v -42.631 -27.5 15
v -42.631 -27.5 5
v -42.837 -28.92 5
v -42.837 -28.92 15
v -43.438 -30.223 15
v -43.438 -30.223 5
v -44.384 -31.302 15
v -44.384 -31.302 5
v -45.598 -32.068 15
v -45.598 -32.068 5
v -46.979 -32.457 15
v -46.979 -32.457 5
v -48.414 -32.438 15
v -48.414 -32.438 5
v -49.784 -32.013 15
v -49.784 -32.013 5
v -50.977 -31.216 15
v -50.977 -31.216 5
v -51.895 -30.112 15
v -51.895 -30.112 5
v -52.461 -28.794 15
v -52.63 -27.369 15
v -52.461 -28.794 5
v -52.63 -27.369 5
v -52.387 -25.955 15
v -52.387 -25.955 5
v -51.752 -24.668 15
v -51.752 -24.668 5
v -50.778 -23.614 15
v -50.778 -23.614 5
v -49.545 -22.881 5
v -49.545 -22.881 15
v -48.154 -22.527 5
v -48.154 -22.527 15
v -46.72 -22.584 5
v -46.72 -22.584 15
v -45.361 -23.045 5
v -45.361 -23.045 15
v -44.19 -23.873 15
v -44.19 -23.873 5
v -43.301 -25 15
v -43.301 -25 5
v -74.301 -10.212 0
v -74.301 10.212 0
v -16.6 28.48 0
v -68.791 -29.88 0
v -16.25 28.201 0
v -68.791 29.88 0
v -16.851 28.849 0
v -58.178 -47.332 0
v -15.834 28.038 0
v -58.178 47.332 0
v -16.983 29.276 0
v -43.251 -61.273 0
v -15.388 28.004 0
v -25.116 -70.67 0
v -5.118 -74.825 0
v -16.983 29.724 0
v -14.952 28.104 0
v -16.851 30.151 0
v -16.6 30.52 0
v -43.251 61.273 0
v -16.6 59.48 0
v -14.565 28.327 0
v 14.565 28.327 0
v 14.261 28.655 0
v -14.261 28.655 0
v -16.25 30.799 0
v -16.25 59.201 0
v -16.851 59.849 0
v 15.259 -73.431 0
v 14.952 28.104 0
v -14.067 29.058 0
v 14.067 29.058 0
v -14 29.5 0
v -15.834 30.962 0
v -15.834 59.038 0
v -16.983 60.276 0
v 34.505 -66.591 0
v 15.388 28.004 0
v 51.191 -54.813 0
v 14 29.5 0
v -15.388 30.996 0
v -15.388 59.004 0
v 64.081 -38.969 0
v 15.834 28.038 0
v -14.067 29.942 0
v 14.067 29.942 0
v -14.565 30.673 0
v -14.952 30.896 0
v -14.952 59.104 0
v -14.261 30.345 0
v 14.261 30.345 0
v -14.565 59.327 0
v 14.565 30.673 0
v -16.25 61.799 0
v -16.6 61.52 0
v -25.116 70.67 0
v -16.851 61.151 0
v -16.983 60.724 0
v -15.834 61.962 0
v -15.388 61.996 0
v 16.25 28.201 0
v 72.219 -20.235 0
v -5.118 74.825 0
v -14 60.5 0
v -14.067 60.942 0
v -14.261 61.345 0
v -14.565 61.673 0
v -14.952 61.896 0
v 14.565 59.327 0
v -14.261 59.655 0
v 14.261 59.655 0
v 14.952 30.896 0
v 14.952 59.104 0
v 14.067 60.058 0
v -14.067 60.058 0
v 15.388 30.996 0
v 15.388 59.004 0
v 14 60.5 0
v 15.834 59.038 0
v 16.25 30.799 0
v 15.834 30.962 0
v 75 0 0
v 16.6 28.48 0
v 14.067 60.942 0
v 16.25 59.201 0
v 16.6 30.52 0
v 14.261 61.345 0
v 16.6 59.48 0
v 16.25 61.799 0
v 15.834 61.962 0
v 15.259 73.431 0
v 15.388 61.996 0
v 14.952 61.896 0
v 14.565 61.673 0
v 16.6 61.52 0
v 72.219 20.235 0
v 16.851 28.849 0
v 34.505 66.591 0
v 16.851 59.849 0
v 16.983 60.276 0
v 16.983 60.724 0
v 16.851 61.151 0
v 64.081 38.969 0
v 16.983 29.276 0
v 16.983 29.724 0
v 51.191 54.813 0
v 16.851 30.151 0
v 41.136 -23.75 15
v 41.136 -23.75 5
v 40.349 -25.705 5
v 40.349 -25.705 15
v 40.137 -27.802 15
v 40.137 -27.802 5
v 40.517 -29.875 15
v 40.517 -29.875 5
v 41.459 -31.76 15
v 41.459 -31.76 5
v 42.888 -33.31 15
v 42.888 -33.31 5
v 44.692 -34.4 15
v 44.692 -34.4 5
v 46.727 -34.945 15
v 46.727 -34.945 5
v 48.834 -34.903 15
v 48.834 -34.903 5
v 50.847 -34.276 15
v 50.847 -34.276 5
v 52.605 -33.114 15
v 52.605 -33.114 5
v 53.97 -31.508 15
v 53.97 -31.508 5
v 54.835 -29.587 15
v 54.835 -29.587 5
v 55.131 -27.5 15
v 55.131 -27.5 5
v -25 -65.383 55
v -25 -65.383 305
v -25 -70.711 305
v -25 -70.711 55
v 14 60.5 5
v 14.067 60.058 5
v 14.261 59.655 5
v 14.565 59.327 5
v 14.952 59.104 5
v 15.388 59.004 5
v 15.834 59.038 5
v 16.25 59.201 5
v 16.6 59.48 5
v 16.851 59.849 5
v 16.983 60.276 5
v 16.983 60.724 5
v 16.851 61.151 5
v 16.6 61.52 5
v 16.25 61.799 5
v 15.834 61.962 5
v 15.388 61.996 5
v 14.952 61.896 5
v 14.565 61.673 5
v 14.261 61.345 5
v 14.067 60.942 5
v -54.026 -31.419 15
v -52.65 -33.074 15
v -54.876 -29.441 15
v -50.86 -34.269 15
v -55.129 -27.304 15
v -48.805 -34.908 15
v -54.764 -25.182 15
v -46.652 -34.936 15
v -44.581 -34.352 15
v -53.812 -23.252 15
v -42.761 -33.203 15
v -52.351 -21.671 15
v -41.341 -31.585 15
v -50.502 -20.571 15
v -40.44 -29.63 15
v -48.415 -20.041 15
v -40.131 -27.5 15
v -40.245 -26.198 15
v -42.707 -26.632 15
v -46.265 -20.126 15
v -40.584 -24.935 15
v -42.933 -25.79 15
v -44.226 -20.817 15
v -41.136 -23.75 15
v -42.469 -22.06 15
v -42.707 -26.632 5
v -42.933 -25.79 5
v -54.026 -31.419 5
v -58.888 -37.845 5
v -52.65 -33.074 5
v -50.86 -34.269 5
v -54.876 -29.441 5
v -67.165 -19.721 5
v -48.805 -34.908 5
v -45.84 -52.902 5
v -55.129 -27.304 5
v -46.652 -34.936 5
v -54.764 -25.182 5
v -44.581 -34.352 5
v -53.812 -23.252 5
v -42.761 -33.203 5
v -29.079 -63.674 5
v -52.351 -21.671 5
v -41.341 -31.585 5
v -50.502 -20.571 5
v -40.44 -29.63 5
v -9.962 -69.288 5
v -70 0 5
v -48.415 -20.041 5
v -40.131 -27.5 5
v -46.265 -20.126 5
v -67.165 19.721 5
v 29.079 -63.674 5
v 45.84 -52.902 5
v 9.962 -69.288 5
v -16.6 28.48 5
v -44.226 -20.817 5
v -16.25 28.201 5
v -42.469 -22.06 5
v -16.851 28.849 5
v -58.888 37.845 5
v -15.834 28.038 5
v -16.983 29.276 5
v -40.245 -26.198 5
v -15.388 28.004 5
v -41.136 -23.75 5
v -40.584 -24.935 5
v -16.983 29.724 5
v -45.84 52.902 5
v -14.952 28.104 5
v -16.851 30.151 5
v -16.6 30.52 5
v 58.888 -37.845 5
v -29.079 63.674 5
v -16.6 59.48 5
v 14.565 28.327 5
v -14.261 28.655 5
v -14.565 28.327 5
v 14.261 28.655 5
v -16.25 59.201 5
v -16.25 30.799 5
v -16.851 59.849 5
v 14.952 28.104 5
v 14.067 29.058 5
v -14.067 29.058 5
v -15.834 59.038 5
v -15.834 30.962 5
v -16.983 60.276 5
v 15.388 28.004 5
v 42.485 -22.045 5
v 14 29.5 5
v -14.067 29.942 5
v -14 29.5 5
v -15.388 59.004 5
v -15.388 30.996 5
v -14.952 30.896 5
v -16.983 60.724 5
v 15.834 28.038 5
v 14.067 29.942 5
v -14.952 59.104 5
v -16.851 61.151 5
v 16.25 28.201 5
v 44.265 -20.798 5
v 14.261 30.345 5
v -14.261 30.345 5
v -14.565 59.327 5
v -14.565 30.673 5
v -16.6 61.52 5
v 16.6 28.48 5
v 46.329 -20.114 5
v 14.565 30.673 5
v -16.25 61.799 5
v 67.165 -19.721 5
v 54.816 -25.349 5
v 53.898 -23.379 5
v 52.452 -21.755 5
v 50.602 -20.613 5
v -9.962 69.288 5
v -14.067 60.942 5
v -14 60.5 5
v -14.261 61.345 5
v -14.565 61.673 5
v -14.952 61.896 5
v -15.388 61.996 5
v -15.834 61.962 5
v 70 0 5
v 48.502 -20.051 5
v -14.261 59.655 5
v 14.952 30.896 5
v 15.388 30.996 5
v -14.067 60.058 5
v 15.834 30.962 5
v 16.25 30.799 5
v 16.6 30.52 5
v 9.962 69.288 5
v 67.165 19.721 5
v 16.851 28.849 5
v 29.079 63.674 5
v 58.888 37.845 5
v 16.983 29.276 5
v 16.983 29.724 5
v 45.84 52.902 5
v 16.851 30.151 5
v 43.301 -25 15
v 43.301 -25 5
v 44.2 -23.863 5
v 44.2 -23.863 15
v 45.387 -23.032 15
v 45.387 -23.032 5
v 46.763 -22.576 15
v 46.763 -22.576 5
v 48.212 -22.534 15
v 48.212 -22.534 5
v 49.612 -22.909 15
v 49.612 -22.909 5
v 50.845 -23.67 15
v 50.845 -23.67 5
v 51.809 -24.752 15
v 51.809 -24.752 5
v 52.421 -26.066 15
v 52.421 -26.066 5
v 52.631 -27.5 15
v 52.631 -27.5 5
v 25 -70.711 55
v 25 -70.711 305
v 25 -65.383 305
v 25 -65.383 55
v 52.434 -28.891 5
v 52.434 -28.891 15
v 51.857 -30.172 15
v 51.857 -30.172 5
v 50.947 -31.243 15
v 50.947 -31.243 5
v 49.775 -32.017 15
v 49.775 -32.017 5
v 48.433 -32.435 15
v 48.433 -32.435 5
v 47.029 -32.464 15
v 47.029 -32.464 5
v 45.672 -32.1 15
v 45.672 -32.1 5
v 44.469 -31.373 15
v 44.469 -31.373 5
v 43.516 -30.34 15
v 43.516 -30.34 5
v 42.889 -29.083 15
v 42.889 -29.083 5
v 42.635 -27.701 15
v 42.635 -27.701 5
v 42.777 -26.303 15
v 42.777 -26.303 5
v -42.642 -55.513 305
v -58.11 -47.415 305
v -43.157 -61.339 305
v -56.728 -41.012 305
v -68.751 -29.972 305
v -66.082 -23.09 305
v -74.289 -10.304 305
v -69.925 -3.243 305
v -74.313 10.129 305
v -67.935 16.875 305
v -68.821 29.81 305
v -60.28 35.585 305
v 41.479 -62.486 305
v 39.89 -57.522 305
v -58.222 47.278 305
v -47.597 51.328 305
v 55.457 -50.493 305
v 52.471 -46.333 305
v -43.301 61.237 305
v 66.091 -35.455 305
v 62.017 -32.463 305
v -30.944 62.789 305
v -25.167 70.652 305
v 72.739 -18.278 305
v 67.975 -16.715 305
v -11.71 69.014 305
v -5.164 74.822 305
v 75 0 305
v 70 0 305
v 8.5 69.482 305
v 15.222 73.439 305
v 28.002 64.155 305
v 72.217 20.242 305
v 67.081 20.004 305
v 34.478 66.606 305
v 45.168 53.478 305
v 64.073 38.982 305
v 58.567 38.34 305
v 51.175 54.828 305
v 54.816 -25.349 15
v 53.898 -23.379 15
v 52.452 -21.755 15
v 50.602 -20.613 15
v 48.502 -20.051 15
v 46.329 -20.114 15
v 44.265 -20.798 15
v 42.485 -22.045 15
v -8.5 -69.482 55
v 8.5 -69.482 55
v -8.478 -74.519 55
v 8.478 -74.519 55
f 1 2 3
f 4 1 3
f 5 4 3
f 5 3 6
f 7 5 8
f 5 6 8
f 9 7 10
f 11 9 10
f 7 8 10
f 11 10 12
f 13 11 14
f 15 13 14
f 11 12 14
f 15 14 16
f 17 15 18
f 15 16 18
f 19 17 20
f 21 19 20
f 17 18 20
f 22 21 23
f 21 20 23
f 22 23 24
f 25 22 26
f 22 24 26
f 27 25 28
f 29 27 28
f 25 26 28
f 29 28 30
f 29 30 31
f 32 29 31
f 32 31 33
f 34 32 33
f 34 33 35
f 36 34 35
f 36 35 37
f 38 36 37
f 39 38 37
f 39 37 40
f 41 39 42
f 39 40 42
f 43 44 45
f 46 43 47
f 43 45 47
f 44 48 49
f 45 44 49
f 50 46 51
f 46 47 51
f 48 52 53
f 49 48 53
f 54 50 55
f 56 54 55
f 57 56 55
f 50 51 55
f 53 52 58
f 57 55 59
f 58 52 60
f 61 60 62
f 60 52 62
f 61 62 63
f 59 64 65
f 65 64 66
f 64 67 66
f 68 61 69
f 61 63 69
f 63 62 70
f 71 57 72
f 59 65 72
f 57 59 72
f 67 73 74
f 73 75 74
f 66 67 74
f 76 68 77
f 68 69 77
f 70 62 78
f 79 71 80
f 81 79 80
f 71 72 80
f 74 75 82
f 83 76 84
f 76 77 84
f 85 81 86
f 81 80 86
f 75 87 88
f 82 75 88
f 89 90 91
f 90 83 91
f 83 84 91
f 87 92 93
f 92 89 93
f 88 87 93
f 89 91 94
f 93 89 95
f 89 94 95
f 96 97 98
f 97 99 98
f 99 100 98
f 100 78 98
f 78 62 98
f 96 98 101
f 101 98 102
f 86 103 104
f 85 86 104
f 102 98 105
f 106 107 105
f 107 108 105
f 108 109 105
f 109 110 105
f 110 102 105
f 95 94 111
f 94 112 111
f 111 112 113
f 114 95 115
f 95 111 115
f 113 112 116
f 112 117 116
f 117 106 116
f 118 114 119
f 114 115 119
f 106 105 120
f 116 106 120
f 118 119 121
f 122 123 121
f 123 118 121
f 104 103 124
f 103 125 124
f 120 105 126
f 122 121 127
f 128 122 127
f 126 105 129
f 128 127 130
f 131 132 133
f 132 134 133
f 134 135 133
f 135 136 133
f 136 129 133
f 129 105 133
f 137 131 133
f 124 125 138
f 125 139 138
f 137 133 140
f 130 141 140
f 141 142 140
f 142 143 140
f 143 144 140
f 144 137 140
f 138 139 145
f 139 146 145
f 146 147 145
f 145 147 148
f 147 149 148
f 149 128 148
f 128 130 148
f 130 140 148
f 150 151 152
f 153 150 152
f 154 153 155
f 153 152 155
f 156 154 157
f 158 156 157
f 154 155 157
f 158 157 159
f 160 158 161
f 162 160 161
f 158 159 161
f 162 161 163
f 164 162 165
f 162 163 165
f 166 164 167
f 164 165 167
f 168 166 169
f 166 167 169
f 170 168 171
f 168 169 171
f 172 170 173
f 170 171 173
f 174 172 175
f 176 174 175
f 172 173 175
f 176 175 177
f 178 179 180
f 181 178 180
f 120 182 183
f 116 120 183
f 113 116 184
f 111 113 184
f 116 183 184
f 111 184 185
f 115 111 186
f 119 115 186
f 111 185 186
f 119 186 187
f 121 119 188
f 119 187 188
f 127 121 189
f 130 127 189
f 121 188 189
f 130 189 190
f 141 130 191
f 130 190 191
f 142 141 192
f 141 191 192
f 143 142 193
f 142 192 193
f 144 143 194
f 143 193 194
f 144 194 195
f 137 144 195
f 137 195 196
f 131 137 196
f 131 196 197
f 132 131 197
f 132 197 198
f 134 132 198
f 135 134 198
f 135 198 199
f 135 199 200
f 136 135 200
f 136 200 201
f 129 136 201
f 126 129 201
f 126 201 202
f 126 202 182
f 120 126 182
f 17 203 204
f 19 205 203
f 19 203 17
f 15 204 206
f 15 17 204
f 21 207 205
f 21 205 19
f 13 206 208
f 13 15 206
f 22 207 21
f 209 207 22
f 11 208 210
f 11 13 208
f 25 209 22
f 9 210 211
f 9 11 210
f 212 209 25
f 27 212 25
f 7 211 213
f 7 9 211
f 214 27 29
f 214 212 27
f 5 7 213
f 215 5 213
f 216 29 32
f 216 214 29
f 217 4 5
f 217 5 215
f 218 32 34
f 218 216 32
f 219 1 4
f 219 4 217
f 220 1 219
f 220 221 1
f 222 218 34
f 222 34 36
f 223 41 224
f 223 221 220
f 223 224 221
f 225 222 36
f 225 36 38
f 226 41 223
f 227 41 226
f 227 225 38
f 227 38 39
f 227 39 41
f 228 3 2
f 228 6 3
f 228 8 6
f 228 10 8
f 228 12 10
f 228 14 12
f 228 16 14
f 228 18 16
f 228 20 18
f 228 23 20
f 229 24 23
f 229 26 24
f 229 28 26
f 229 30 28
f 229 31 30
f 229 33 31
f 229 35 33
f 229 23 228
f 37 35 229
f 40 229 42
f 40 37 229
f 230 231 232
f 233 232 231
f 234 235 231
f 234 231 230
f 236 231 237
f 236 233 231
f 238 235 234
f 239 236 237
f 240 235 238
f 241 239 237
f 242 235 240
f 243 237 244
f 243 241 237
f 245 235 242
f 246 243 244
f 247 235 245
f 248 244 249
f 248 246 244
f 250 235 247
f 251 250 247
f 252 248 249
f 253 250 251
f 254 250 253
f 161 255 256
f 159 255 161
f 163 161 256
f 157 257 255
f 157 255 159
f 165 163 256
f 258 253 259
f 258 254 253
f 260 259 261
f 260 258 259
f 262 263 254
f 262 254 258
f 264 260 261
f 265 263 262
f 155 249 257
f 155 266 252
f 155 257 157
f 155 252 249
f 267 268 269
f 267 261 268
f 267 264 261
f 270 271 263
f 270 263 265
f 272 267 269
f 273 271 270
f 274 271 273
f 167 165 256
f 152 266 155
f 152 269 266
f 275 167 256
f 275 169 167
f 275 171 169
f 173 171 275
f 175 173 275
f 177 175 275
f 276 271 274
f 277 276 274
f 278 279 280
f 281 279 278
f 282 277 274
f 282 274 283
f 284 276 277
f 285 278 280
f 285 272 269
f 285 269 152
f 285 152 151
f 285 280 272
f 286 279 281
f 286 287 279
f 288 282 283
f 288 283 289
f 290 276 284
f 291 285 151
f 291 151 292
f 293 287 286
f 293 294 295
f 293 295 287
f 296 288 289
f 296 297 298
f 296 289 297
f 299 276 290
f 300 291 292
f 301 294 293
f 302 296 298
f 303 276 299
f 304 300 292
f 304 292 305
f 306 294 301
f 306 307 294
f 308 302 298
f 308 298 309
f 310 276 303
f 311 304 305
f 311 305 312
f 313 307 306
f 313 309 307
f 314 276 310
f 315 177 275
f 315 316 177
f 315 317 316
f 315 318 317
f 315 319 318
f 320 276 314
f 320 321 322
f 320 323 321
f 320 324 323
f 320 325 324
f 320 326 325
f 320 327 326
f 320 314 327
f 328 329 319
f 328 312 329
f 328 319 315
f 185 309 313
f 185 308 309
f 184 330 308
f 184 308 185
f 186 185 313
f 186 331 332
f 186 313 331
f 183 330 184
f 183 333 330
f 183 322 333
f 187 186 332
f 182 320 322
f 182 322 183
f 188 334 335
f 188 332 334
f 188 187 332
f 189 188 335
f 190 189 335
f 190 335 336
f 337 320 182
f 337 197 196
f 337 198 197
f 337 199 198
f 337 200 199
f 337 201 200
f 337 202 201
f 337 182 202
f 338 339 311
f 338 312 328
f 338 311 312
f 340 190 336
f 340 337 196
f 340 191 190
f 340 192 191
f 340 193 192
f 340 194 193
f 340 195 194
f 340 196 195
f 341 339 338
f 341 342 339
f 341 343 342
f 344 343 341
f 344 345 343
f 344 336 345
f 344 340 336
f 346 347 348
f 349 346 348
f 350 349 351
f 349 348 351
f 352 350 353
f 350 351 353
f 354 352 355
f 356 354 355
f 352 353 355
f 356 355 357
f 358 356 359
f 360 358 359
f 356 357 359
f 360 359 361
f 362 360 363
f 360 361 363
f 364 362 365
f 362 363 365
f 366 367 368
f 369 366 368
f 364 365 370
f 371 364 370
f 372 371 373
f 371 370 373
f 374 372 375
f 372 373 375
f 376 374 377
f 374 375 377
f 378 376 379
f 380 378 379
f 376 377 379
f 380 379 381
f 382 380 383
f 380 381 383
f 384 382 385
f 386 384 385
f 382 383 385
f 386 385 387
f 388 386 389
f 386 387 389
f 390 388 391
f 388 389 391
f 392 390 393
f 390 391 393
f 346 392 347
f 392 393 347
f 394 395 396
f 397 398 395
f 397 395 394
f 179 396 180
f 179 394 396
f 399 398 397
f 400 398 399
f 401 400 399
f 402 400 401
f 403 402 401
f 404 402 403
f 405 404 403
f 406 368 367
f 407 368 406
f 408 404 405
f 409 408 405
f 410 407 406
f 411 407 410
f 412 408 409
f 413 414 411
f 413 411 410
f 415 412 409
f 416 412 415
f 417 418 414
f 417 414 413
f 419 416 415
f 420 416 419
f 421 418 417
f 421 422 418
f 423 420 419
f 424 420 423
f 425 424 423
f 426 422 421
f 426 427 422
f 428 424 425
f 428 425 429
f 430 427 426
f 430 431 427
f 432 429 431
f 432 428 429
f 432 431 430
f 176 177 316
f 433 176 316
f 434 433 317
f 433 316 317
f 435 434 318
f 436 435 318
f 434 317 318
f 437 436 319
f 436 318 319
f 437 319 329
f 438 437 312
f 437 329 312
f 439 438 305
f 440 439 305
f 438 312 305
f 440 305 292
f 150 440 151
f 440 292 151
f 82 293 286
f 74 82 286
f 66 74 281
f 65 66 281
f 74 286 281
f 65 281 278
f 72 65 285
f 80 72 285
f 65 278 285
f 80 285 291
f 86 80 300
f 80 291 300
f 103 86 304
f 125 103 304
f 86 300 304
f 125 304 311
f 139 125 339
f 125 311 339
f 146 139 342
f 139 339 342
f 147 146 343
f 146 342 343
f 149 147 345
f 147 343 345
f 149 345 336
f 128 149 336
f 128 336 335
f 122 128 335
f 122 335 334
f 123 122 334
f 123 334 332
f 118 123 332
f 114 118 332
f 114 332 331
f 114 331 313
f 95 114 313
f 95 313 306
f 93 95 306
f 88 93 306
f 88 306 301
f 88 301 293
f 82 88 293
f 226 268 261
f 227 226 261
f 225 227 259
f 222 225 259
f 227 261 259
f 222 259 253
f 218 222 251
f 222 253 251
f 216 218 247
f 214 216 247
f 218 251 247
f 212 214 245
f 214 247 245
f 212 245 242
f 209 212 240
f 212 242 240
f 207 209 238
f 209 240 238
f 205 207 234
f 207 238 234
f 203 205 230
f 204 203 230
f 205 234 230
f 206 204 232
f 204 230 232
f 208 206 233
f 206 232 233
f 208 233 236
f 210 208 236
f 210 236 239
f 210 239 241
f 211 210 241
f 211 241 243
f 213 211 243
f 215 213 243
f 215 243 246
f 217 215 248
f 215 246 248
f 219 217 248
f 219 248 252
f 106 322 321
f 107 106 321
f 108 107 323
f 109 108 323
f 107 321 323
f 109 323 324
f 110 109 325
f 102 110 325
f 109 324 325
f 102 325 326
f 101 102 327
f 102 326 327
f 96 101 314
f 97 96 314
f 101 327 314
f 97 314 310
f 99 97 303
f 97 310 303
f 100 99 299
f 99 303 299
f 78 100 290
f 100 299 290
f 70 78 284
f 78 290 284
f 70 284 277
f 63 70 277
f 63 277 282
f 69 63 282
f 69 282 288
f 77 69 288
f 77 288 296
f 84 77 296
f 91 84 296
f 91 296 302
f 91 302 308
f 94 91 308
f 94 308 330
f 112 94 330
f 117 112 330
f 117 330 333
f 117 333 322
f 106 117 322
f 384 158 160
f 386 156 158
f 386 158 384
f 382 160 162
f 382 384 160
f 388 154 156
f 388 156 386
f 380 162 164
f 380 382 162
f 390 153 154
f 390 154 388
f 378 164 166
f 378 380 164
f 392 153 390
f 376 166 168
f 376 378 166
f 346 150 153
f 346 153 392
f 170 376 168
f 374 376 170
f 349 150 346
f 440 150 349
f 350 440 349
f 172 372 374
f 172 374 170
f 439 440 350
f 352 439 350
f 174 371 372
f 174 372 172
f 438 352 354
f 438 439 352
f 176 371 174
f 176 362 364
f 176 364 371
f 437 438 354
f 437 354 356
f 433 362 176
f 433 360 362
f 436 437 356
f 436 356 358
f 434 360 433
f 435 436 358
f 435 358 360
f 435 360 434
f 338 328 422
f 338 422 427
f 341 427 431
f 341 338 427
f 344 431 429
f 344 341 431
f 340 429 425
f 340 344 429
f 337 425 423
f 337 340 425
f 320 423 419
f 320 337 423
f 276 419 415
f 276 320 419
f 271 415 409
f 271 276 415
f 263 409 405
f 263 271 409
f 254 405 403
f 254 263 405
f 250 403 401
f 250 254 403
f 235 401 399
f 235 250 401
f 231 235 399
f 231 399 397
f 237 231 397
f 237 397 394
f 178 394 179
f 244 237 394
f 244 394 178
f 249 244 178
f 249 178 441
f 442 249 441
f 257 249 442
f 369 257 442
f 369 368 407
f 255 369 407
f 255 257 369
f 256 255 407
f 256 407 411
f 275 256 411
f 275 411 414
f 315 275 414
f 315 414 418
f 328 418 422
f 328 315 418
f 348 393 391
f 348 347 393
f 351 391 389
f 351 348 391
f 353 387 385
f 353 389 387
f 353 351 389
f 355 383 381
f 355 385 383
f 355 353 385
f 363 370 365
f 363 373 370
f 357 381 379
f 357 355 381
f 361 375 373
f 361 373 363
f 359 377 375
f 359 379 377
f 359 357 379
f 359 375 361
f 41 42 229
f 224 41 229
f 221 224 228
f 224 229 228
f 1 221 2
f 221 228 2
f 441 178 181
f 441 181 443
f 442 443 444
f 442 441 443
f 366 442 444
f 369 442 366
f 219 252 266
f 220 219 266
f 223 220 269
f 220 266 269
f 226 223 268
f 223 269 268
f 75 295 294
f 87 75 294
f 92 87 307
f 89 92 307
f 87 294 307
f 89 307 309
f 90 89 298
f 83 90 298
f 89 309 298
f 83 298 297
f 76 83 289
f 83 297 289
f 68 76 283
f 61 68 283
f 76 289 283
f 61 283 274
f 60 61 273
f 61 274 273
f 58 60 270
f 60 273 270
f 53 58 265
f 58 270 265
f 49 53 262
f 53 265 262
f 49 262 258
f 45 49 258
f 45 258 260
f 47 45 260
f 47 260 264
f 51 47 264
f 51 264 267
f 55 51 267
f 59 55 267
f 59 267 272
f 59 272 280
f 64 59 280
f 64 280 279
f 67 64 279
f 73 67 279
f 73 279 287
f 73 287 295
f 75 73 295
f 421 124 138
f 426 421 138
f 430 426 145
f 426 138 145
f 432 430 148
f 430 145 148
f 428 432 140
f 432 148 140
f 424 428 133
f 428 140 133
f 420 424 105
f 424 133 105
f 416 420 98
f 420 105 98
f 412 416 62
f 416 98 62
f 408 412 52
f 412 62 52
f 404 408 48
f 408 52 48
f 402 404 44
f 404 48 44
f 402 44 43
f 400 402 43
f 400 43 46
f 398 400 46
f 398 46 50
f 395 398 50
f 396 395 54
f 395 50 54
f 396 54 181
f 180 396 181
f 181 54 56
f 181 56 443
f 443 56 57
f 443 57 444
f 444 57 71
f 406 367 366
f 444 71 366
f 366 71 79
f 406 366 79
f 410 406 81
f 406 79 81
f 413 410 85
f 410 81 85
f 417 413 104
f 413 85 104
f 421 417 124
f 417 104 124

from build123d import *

# Parameters (mm, degrees)
F0_R     = 75
F1_DEPTH = 5
F2_R     = 75
F2_R_2   = 70
F3_DEPTH = 300
F5_DEPTH = 250
F6_R     = 1.5
F7_DEPTH = 25
F9_DEPTH = 10


with BuildPart() as f1:
    # F0 (on Top) → F1 (new body)
    with BuildSketch(Plane.XY):
        Circle(F0_R)
    extrude(amount=F1_DEPTH)

    # F2 (on face) → F3 (join)
    with BuildSketch(Plane.XY.offset(5)):
        Circle(F2_R)
        Circle(F2_R_2, mode=Mode.SUBTRACT)
    extrude(amount=F3_DEPTH)

    # F4 (on face) → F5 (cut)
    with BuildSketch(Plane.XY.offset(305)):
        with BuildLine():
            Line((25, -70.7106781187), (25, -65.3834841531))
            ThreePointArc((25, -65.3834841531), (0, -70), (-25, -65.3834841531))
            Line((-25, -65.3834841531), (-25, -70.7106781187))
            ThreePointArc((-25, -70.7106781187), (0, -75), (25, -70.7106781187))
        make_face()
    extrude(amount=-F5_DEPTH, mode=Mode.SUBTRACT)

    # F6 (on face) → F7 (cut)
    with BuildSketch(Plane.XY.offset(5)):
        with Locations((-15.5, 60.5)):
            Circle(F6_R)
        with BuildLine():
            ThreePointArc((17, 60.5), (15.5, 62), (14, 60.5))
            ThreePointArc((14, 60.5), (15.5, 59), (17, 60.5))
        make_face()
        with BuildLine():
            ThreePointArc((17, 29.5), (15.5, 31), (14, 29.5))
            ThreePointArc((14, 29.5), (15.5, 28), (17, 29.5))
        make_face()
        with Locations((-15.5, 29.5)):
            Circle(F6_R)
    extrude(amount=-F7_DEPTH, mode=Mode.SUBTRACT)

    # F8 (on face) → F9 (join)
    with BuildSketch(Plane.XY.offset(5)):
        with BuildLine():
            ThreePointArc((-40.1313972081, -27.5), (-40.386953511, -25.5588571617), (-41.1362066798, -23.75))
            ThreePointArc((-41.1362066798, -23.75), (-54.8758409053, -29.4411428383), (-40.1313972081, -27.5))
        make_face()
        with BuildLine():
            ThreePointArc((-42.6313972081, -27.5), (-52.4610263396, -28.7940952255), (-43.3012701892, -25))
            ThreePointArc((-43.3012701892, -25), (-42.8017680767, -26.2059047745), (-42.6313972081, -27.5))
        make_face(mode=Mode.SUBTRACT)
        with BuildLine():
            ThreePointArc((55.1313972081, -27.5), (49.5725400464, -20.2555563028), (41.1362066798, -23.75))
            ThreePointArc((41.1362066798, -23.75), (45.6902543699, -34.7444436972), (55.1313972081, -27.5))
        make_face()
        with BuildLine():
            ThreePointArc((52.6313972081, -27.5), (46.3373019826, -32.3296291314), (43.3012701892, -25))
            ThreePointArc((43.3012701892, -25), (48.9254924337, -22.6703708686), (52.6313972081, -27.5))
        make_face(mode=Mode.SUBTRACT)
    extrude(amount=F9_DEPTH)


solid = f1.part
